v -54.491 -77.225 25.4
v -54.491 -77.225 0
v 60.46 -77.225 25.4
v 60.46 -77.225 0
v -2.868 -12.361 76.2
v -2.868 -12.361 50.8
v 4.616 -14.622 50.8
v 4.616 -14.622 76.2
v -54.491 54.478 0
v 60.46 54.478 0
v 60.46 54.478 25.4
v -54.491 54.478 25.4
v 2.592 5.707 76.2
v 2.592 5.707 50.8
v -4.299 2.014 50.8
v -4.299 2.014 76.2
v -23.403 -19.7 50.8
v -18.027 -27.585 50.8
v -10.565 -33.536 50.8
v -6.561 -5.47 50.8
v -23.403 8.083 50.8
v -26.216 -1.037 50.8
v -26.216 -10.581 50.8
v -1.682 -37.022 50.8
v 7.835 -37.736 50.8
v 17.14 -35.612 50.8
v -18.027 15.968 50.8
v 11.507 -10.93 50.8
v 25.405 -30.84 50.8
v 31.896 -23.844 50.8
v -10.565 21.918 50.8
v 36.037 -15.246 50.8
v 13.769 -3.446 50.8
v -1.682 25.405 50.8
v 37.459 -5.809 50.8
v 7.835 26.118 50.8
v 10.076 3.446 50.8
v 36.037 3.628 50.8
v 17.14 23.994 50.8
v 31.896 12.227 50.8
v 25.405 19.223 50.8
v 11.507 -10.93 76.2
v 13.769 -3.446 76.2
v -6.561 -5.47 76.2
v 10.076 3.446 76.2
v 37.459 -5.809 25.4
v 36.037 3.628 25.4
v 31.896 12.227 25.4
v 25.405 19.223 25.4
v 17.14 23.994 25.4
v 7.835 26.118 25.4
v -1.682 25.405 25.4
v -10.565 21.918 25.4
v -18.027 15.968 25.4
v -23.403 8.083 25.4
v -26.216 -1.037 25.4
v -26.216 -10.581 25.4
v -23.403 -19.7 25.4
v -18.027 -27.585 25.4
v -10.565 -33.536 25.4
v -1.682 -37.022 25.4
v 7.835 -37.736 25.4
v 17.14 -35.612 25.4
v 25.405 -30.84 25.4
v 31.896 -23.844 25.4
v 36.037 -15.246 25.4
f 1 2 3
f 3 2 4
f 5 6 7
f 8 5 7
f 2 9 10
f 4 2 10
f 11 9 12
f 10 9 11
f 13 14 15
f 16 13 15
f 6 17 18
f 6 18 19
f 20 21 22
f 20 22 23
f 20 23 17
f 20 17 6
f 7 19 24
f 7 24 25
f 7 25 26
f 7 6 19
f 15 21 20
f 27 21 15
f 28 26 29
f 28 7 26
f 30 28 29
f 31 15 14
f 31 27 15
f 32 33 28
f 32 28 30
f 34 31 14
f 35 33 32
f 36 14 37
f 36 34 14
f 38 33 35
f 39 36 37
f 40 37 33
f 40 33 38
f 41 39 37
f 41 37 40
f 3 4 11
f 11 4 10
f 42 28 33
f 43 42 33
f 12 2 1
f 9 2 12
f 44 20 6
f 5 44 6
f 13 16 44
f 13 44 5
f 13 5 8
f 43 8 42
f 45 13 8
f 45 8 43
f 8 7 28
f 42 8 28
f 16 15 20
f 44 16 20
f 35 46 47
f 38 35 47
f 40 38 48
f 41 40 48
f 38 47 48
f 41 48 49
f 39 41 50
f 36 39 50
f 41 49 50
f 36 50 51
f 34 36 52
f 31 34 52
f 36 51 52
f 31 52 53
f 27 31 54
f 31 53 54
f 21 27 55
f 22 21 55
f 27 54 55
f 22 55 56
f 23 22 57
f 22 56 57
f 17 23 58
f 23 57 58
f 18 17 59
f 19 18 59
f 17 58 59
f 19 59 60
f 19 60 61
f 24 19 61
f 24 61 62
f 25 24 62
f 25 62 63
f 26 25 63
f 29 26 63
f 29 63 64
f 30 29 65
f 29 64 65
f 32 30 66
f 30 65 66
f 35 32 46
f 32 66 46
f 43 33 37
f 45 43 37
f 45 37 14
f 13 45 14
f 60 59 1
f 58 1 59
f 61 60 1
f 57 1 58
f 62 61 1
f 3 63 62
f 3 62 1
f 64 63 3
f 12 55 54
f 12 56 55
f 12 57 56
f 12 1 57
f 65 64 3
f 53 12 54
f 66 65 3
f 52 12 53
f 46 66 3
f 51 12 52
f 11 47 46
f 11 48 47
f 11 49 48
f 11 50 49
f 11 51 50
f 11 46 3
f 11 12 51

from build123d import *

# Parameters (mm, degrees)
F0_W     = 114.950902
F0_H     = 131.703299
F1_DEPTH = 25.4
F2_R     = 32.016322
F3_DEPTH = 25.4
F5_DEPTH = 25.4


with BuildPart() as f1:
    # F0 (on Top) → F1 (new body)
    with BuildSketch(Plane.XY):
        with Locations((2.984099, -11.373715)):
            Rectangle(F0_W, F0_H)
    extrude(amount=F1_DEPTH)

    # F2 (on face) → F3 (join)
    with BuildSketch(Plane.XY.offset(25.4)):
        with Locations((5.44278, -5.808717)):
            Circle(F2_R)
    extrude(amount=F3_DEPTH)

    # F4 (on face) → F5 (join)
    with BuildSketch(Plane.XY.offset(50.8)):
        Polygon((13.768743, -3.445501), (10.075767, 3.445501), (2.591765, 5.706847), (-4.299238, 2.013872), (-6.560584, -5.470131), (-2.867608, -12.361133), (4.616394, -14.622479), (11.507397, -10.929504), align=None)
    extrude(amount=F5_DEPTH)


solid = f1.part
